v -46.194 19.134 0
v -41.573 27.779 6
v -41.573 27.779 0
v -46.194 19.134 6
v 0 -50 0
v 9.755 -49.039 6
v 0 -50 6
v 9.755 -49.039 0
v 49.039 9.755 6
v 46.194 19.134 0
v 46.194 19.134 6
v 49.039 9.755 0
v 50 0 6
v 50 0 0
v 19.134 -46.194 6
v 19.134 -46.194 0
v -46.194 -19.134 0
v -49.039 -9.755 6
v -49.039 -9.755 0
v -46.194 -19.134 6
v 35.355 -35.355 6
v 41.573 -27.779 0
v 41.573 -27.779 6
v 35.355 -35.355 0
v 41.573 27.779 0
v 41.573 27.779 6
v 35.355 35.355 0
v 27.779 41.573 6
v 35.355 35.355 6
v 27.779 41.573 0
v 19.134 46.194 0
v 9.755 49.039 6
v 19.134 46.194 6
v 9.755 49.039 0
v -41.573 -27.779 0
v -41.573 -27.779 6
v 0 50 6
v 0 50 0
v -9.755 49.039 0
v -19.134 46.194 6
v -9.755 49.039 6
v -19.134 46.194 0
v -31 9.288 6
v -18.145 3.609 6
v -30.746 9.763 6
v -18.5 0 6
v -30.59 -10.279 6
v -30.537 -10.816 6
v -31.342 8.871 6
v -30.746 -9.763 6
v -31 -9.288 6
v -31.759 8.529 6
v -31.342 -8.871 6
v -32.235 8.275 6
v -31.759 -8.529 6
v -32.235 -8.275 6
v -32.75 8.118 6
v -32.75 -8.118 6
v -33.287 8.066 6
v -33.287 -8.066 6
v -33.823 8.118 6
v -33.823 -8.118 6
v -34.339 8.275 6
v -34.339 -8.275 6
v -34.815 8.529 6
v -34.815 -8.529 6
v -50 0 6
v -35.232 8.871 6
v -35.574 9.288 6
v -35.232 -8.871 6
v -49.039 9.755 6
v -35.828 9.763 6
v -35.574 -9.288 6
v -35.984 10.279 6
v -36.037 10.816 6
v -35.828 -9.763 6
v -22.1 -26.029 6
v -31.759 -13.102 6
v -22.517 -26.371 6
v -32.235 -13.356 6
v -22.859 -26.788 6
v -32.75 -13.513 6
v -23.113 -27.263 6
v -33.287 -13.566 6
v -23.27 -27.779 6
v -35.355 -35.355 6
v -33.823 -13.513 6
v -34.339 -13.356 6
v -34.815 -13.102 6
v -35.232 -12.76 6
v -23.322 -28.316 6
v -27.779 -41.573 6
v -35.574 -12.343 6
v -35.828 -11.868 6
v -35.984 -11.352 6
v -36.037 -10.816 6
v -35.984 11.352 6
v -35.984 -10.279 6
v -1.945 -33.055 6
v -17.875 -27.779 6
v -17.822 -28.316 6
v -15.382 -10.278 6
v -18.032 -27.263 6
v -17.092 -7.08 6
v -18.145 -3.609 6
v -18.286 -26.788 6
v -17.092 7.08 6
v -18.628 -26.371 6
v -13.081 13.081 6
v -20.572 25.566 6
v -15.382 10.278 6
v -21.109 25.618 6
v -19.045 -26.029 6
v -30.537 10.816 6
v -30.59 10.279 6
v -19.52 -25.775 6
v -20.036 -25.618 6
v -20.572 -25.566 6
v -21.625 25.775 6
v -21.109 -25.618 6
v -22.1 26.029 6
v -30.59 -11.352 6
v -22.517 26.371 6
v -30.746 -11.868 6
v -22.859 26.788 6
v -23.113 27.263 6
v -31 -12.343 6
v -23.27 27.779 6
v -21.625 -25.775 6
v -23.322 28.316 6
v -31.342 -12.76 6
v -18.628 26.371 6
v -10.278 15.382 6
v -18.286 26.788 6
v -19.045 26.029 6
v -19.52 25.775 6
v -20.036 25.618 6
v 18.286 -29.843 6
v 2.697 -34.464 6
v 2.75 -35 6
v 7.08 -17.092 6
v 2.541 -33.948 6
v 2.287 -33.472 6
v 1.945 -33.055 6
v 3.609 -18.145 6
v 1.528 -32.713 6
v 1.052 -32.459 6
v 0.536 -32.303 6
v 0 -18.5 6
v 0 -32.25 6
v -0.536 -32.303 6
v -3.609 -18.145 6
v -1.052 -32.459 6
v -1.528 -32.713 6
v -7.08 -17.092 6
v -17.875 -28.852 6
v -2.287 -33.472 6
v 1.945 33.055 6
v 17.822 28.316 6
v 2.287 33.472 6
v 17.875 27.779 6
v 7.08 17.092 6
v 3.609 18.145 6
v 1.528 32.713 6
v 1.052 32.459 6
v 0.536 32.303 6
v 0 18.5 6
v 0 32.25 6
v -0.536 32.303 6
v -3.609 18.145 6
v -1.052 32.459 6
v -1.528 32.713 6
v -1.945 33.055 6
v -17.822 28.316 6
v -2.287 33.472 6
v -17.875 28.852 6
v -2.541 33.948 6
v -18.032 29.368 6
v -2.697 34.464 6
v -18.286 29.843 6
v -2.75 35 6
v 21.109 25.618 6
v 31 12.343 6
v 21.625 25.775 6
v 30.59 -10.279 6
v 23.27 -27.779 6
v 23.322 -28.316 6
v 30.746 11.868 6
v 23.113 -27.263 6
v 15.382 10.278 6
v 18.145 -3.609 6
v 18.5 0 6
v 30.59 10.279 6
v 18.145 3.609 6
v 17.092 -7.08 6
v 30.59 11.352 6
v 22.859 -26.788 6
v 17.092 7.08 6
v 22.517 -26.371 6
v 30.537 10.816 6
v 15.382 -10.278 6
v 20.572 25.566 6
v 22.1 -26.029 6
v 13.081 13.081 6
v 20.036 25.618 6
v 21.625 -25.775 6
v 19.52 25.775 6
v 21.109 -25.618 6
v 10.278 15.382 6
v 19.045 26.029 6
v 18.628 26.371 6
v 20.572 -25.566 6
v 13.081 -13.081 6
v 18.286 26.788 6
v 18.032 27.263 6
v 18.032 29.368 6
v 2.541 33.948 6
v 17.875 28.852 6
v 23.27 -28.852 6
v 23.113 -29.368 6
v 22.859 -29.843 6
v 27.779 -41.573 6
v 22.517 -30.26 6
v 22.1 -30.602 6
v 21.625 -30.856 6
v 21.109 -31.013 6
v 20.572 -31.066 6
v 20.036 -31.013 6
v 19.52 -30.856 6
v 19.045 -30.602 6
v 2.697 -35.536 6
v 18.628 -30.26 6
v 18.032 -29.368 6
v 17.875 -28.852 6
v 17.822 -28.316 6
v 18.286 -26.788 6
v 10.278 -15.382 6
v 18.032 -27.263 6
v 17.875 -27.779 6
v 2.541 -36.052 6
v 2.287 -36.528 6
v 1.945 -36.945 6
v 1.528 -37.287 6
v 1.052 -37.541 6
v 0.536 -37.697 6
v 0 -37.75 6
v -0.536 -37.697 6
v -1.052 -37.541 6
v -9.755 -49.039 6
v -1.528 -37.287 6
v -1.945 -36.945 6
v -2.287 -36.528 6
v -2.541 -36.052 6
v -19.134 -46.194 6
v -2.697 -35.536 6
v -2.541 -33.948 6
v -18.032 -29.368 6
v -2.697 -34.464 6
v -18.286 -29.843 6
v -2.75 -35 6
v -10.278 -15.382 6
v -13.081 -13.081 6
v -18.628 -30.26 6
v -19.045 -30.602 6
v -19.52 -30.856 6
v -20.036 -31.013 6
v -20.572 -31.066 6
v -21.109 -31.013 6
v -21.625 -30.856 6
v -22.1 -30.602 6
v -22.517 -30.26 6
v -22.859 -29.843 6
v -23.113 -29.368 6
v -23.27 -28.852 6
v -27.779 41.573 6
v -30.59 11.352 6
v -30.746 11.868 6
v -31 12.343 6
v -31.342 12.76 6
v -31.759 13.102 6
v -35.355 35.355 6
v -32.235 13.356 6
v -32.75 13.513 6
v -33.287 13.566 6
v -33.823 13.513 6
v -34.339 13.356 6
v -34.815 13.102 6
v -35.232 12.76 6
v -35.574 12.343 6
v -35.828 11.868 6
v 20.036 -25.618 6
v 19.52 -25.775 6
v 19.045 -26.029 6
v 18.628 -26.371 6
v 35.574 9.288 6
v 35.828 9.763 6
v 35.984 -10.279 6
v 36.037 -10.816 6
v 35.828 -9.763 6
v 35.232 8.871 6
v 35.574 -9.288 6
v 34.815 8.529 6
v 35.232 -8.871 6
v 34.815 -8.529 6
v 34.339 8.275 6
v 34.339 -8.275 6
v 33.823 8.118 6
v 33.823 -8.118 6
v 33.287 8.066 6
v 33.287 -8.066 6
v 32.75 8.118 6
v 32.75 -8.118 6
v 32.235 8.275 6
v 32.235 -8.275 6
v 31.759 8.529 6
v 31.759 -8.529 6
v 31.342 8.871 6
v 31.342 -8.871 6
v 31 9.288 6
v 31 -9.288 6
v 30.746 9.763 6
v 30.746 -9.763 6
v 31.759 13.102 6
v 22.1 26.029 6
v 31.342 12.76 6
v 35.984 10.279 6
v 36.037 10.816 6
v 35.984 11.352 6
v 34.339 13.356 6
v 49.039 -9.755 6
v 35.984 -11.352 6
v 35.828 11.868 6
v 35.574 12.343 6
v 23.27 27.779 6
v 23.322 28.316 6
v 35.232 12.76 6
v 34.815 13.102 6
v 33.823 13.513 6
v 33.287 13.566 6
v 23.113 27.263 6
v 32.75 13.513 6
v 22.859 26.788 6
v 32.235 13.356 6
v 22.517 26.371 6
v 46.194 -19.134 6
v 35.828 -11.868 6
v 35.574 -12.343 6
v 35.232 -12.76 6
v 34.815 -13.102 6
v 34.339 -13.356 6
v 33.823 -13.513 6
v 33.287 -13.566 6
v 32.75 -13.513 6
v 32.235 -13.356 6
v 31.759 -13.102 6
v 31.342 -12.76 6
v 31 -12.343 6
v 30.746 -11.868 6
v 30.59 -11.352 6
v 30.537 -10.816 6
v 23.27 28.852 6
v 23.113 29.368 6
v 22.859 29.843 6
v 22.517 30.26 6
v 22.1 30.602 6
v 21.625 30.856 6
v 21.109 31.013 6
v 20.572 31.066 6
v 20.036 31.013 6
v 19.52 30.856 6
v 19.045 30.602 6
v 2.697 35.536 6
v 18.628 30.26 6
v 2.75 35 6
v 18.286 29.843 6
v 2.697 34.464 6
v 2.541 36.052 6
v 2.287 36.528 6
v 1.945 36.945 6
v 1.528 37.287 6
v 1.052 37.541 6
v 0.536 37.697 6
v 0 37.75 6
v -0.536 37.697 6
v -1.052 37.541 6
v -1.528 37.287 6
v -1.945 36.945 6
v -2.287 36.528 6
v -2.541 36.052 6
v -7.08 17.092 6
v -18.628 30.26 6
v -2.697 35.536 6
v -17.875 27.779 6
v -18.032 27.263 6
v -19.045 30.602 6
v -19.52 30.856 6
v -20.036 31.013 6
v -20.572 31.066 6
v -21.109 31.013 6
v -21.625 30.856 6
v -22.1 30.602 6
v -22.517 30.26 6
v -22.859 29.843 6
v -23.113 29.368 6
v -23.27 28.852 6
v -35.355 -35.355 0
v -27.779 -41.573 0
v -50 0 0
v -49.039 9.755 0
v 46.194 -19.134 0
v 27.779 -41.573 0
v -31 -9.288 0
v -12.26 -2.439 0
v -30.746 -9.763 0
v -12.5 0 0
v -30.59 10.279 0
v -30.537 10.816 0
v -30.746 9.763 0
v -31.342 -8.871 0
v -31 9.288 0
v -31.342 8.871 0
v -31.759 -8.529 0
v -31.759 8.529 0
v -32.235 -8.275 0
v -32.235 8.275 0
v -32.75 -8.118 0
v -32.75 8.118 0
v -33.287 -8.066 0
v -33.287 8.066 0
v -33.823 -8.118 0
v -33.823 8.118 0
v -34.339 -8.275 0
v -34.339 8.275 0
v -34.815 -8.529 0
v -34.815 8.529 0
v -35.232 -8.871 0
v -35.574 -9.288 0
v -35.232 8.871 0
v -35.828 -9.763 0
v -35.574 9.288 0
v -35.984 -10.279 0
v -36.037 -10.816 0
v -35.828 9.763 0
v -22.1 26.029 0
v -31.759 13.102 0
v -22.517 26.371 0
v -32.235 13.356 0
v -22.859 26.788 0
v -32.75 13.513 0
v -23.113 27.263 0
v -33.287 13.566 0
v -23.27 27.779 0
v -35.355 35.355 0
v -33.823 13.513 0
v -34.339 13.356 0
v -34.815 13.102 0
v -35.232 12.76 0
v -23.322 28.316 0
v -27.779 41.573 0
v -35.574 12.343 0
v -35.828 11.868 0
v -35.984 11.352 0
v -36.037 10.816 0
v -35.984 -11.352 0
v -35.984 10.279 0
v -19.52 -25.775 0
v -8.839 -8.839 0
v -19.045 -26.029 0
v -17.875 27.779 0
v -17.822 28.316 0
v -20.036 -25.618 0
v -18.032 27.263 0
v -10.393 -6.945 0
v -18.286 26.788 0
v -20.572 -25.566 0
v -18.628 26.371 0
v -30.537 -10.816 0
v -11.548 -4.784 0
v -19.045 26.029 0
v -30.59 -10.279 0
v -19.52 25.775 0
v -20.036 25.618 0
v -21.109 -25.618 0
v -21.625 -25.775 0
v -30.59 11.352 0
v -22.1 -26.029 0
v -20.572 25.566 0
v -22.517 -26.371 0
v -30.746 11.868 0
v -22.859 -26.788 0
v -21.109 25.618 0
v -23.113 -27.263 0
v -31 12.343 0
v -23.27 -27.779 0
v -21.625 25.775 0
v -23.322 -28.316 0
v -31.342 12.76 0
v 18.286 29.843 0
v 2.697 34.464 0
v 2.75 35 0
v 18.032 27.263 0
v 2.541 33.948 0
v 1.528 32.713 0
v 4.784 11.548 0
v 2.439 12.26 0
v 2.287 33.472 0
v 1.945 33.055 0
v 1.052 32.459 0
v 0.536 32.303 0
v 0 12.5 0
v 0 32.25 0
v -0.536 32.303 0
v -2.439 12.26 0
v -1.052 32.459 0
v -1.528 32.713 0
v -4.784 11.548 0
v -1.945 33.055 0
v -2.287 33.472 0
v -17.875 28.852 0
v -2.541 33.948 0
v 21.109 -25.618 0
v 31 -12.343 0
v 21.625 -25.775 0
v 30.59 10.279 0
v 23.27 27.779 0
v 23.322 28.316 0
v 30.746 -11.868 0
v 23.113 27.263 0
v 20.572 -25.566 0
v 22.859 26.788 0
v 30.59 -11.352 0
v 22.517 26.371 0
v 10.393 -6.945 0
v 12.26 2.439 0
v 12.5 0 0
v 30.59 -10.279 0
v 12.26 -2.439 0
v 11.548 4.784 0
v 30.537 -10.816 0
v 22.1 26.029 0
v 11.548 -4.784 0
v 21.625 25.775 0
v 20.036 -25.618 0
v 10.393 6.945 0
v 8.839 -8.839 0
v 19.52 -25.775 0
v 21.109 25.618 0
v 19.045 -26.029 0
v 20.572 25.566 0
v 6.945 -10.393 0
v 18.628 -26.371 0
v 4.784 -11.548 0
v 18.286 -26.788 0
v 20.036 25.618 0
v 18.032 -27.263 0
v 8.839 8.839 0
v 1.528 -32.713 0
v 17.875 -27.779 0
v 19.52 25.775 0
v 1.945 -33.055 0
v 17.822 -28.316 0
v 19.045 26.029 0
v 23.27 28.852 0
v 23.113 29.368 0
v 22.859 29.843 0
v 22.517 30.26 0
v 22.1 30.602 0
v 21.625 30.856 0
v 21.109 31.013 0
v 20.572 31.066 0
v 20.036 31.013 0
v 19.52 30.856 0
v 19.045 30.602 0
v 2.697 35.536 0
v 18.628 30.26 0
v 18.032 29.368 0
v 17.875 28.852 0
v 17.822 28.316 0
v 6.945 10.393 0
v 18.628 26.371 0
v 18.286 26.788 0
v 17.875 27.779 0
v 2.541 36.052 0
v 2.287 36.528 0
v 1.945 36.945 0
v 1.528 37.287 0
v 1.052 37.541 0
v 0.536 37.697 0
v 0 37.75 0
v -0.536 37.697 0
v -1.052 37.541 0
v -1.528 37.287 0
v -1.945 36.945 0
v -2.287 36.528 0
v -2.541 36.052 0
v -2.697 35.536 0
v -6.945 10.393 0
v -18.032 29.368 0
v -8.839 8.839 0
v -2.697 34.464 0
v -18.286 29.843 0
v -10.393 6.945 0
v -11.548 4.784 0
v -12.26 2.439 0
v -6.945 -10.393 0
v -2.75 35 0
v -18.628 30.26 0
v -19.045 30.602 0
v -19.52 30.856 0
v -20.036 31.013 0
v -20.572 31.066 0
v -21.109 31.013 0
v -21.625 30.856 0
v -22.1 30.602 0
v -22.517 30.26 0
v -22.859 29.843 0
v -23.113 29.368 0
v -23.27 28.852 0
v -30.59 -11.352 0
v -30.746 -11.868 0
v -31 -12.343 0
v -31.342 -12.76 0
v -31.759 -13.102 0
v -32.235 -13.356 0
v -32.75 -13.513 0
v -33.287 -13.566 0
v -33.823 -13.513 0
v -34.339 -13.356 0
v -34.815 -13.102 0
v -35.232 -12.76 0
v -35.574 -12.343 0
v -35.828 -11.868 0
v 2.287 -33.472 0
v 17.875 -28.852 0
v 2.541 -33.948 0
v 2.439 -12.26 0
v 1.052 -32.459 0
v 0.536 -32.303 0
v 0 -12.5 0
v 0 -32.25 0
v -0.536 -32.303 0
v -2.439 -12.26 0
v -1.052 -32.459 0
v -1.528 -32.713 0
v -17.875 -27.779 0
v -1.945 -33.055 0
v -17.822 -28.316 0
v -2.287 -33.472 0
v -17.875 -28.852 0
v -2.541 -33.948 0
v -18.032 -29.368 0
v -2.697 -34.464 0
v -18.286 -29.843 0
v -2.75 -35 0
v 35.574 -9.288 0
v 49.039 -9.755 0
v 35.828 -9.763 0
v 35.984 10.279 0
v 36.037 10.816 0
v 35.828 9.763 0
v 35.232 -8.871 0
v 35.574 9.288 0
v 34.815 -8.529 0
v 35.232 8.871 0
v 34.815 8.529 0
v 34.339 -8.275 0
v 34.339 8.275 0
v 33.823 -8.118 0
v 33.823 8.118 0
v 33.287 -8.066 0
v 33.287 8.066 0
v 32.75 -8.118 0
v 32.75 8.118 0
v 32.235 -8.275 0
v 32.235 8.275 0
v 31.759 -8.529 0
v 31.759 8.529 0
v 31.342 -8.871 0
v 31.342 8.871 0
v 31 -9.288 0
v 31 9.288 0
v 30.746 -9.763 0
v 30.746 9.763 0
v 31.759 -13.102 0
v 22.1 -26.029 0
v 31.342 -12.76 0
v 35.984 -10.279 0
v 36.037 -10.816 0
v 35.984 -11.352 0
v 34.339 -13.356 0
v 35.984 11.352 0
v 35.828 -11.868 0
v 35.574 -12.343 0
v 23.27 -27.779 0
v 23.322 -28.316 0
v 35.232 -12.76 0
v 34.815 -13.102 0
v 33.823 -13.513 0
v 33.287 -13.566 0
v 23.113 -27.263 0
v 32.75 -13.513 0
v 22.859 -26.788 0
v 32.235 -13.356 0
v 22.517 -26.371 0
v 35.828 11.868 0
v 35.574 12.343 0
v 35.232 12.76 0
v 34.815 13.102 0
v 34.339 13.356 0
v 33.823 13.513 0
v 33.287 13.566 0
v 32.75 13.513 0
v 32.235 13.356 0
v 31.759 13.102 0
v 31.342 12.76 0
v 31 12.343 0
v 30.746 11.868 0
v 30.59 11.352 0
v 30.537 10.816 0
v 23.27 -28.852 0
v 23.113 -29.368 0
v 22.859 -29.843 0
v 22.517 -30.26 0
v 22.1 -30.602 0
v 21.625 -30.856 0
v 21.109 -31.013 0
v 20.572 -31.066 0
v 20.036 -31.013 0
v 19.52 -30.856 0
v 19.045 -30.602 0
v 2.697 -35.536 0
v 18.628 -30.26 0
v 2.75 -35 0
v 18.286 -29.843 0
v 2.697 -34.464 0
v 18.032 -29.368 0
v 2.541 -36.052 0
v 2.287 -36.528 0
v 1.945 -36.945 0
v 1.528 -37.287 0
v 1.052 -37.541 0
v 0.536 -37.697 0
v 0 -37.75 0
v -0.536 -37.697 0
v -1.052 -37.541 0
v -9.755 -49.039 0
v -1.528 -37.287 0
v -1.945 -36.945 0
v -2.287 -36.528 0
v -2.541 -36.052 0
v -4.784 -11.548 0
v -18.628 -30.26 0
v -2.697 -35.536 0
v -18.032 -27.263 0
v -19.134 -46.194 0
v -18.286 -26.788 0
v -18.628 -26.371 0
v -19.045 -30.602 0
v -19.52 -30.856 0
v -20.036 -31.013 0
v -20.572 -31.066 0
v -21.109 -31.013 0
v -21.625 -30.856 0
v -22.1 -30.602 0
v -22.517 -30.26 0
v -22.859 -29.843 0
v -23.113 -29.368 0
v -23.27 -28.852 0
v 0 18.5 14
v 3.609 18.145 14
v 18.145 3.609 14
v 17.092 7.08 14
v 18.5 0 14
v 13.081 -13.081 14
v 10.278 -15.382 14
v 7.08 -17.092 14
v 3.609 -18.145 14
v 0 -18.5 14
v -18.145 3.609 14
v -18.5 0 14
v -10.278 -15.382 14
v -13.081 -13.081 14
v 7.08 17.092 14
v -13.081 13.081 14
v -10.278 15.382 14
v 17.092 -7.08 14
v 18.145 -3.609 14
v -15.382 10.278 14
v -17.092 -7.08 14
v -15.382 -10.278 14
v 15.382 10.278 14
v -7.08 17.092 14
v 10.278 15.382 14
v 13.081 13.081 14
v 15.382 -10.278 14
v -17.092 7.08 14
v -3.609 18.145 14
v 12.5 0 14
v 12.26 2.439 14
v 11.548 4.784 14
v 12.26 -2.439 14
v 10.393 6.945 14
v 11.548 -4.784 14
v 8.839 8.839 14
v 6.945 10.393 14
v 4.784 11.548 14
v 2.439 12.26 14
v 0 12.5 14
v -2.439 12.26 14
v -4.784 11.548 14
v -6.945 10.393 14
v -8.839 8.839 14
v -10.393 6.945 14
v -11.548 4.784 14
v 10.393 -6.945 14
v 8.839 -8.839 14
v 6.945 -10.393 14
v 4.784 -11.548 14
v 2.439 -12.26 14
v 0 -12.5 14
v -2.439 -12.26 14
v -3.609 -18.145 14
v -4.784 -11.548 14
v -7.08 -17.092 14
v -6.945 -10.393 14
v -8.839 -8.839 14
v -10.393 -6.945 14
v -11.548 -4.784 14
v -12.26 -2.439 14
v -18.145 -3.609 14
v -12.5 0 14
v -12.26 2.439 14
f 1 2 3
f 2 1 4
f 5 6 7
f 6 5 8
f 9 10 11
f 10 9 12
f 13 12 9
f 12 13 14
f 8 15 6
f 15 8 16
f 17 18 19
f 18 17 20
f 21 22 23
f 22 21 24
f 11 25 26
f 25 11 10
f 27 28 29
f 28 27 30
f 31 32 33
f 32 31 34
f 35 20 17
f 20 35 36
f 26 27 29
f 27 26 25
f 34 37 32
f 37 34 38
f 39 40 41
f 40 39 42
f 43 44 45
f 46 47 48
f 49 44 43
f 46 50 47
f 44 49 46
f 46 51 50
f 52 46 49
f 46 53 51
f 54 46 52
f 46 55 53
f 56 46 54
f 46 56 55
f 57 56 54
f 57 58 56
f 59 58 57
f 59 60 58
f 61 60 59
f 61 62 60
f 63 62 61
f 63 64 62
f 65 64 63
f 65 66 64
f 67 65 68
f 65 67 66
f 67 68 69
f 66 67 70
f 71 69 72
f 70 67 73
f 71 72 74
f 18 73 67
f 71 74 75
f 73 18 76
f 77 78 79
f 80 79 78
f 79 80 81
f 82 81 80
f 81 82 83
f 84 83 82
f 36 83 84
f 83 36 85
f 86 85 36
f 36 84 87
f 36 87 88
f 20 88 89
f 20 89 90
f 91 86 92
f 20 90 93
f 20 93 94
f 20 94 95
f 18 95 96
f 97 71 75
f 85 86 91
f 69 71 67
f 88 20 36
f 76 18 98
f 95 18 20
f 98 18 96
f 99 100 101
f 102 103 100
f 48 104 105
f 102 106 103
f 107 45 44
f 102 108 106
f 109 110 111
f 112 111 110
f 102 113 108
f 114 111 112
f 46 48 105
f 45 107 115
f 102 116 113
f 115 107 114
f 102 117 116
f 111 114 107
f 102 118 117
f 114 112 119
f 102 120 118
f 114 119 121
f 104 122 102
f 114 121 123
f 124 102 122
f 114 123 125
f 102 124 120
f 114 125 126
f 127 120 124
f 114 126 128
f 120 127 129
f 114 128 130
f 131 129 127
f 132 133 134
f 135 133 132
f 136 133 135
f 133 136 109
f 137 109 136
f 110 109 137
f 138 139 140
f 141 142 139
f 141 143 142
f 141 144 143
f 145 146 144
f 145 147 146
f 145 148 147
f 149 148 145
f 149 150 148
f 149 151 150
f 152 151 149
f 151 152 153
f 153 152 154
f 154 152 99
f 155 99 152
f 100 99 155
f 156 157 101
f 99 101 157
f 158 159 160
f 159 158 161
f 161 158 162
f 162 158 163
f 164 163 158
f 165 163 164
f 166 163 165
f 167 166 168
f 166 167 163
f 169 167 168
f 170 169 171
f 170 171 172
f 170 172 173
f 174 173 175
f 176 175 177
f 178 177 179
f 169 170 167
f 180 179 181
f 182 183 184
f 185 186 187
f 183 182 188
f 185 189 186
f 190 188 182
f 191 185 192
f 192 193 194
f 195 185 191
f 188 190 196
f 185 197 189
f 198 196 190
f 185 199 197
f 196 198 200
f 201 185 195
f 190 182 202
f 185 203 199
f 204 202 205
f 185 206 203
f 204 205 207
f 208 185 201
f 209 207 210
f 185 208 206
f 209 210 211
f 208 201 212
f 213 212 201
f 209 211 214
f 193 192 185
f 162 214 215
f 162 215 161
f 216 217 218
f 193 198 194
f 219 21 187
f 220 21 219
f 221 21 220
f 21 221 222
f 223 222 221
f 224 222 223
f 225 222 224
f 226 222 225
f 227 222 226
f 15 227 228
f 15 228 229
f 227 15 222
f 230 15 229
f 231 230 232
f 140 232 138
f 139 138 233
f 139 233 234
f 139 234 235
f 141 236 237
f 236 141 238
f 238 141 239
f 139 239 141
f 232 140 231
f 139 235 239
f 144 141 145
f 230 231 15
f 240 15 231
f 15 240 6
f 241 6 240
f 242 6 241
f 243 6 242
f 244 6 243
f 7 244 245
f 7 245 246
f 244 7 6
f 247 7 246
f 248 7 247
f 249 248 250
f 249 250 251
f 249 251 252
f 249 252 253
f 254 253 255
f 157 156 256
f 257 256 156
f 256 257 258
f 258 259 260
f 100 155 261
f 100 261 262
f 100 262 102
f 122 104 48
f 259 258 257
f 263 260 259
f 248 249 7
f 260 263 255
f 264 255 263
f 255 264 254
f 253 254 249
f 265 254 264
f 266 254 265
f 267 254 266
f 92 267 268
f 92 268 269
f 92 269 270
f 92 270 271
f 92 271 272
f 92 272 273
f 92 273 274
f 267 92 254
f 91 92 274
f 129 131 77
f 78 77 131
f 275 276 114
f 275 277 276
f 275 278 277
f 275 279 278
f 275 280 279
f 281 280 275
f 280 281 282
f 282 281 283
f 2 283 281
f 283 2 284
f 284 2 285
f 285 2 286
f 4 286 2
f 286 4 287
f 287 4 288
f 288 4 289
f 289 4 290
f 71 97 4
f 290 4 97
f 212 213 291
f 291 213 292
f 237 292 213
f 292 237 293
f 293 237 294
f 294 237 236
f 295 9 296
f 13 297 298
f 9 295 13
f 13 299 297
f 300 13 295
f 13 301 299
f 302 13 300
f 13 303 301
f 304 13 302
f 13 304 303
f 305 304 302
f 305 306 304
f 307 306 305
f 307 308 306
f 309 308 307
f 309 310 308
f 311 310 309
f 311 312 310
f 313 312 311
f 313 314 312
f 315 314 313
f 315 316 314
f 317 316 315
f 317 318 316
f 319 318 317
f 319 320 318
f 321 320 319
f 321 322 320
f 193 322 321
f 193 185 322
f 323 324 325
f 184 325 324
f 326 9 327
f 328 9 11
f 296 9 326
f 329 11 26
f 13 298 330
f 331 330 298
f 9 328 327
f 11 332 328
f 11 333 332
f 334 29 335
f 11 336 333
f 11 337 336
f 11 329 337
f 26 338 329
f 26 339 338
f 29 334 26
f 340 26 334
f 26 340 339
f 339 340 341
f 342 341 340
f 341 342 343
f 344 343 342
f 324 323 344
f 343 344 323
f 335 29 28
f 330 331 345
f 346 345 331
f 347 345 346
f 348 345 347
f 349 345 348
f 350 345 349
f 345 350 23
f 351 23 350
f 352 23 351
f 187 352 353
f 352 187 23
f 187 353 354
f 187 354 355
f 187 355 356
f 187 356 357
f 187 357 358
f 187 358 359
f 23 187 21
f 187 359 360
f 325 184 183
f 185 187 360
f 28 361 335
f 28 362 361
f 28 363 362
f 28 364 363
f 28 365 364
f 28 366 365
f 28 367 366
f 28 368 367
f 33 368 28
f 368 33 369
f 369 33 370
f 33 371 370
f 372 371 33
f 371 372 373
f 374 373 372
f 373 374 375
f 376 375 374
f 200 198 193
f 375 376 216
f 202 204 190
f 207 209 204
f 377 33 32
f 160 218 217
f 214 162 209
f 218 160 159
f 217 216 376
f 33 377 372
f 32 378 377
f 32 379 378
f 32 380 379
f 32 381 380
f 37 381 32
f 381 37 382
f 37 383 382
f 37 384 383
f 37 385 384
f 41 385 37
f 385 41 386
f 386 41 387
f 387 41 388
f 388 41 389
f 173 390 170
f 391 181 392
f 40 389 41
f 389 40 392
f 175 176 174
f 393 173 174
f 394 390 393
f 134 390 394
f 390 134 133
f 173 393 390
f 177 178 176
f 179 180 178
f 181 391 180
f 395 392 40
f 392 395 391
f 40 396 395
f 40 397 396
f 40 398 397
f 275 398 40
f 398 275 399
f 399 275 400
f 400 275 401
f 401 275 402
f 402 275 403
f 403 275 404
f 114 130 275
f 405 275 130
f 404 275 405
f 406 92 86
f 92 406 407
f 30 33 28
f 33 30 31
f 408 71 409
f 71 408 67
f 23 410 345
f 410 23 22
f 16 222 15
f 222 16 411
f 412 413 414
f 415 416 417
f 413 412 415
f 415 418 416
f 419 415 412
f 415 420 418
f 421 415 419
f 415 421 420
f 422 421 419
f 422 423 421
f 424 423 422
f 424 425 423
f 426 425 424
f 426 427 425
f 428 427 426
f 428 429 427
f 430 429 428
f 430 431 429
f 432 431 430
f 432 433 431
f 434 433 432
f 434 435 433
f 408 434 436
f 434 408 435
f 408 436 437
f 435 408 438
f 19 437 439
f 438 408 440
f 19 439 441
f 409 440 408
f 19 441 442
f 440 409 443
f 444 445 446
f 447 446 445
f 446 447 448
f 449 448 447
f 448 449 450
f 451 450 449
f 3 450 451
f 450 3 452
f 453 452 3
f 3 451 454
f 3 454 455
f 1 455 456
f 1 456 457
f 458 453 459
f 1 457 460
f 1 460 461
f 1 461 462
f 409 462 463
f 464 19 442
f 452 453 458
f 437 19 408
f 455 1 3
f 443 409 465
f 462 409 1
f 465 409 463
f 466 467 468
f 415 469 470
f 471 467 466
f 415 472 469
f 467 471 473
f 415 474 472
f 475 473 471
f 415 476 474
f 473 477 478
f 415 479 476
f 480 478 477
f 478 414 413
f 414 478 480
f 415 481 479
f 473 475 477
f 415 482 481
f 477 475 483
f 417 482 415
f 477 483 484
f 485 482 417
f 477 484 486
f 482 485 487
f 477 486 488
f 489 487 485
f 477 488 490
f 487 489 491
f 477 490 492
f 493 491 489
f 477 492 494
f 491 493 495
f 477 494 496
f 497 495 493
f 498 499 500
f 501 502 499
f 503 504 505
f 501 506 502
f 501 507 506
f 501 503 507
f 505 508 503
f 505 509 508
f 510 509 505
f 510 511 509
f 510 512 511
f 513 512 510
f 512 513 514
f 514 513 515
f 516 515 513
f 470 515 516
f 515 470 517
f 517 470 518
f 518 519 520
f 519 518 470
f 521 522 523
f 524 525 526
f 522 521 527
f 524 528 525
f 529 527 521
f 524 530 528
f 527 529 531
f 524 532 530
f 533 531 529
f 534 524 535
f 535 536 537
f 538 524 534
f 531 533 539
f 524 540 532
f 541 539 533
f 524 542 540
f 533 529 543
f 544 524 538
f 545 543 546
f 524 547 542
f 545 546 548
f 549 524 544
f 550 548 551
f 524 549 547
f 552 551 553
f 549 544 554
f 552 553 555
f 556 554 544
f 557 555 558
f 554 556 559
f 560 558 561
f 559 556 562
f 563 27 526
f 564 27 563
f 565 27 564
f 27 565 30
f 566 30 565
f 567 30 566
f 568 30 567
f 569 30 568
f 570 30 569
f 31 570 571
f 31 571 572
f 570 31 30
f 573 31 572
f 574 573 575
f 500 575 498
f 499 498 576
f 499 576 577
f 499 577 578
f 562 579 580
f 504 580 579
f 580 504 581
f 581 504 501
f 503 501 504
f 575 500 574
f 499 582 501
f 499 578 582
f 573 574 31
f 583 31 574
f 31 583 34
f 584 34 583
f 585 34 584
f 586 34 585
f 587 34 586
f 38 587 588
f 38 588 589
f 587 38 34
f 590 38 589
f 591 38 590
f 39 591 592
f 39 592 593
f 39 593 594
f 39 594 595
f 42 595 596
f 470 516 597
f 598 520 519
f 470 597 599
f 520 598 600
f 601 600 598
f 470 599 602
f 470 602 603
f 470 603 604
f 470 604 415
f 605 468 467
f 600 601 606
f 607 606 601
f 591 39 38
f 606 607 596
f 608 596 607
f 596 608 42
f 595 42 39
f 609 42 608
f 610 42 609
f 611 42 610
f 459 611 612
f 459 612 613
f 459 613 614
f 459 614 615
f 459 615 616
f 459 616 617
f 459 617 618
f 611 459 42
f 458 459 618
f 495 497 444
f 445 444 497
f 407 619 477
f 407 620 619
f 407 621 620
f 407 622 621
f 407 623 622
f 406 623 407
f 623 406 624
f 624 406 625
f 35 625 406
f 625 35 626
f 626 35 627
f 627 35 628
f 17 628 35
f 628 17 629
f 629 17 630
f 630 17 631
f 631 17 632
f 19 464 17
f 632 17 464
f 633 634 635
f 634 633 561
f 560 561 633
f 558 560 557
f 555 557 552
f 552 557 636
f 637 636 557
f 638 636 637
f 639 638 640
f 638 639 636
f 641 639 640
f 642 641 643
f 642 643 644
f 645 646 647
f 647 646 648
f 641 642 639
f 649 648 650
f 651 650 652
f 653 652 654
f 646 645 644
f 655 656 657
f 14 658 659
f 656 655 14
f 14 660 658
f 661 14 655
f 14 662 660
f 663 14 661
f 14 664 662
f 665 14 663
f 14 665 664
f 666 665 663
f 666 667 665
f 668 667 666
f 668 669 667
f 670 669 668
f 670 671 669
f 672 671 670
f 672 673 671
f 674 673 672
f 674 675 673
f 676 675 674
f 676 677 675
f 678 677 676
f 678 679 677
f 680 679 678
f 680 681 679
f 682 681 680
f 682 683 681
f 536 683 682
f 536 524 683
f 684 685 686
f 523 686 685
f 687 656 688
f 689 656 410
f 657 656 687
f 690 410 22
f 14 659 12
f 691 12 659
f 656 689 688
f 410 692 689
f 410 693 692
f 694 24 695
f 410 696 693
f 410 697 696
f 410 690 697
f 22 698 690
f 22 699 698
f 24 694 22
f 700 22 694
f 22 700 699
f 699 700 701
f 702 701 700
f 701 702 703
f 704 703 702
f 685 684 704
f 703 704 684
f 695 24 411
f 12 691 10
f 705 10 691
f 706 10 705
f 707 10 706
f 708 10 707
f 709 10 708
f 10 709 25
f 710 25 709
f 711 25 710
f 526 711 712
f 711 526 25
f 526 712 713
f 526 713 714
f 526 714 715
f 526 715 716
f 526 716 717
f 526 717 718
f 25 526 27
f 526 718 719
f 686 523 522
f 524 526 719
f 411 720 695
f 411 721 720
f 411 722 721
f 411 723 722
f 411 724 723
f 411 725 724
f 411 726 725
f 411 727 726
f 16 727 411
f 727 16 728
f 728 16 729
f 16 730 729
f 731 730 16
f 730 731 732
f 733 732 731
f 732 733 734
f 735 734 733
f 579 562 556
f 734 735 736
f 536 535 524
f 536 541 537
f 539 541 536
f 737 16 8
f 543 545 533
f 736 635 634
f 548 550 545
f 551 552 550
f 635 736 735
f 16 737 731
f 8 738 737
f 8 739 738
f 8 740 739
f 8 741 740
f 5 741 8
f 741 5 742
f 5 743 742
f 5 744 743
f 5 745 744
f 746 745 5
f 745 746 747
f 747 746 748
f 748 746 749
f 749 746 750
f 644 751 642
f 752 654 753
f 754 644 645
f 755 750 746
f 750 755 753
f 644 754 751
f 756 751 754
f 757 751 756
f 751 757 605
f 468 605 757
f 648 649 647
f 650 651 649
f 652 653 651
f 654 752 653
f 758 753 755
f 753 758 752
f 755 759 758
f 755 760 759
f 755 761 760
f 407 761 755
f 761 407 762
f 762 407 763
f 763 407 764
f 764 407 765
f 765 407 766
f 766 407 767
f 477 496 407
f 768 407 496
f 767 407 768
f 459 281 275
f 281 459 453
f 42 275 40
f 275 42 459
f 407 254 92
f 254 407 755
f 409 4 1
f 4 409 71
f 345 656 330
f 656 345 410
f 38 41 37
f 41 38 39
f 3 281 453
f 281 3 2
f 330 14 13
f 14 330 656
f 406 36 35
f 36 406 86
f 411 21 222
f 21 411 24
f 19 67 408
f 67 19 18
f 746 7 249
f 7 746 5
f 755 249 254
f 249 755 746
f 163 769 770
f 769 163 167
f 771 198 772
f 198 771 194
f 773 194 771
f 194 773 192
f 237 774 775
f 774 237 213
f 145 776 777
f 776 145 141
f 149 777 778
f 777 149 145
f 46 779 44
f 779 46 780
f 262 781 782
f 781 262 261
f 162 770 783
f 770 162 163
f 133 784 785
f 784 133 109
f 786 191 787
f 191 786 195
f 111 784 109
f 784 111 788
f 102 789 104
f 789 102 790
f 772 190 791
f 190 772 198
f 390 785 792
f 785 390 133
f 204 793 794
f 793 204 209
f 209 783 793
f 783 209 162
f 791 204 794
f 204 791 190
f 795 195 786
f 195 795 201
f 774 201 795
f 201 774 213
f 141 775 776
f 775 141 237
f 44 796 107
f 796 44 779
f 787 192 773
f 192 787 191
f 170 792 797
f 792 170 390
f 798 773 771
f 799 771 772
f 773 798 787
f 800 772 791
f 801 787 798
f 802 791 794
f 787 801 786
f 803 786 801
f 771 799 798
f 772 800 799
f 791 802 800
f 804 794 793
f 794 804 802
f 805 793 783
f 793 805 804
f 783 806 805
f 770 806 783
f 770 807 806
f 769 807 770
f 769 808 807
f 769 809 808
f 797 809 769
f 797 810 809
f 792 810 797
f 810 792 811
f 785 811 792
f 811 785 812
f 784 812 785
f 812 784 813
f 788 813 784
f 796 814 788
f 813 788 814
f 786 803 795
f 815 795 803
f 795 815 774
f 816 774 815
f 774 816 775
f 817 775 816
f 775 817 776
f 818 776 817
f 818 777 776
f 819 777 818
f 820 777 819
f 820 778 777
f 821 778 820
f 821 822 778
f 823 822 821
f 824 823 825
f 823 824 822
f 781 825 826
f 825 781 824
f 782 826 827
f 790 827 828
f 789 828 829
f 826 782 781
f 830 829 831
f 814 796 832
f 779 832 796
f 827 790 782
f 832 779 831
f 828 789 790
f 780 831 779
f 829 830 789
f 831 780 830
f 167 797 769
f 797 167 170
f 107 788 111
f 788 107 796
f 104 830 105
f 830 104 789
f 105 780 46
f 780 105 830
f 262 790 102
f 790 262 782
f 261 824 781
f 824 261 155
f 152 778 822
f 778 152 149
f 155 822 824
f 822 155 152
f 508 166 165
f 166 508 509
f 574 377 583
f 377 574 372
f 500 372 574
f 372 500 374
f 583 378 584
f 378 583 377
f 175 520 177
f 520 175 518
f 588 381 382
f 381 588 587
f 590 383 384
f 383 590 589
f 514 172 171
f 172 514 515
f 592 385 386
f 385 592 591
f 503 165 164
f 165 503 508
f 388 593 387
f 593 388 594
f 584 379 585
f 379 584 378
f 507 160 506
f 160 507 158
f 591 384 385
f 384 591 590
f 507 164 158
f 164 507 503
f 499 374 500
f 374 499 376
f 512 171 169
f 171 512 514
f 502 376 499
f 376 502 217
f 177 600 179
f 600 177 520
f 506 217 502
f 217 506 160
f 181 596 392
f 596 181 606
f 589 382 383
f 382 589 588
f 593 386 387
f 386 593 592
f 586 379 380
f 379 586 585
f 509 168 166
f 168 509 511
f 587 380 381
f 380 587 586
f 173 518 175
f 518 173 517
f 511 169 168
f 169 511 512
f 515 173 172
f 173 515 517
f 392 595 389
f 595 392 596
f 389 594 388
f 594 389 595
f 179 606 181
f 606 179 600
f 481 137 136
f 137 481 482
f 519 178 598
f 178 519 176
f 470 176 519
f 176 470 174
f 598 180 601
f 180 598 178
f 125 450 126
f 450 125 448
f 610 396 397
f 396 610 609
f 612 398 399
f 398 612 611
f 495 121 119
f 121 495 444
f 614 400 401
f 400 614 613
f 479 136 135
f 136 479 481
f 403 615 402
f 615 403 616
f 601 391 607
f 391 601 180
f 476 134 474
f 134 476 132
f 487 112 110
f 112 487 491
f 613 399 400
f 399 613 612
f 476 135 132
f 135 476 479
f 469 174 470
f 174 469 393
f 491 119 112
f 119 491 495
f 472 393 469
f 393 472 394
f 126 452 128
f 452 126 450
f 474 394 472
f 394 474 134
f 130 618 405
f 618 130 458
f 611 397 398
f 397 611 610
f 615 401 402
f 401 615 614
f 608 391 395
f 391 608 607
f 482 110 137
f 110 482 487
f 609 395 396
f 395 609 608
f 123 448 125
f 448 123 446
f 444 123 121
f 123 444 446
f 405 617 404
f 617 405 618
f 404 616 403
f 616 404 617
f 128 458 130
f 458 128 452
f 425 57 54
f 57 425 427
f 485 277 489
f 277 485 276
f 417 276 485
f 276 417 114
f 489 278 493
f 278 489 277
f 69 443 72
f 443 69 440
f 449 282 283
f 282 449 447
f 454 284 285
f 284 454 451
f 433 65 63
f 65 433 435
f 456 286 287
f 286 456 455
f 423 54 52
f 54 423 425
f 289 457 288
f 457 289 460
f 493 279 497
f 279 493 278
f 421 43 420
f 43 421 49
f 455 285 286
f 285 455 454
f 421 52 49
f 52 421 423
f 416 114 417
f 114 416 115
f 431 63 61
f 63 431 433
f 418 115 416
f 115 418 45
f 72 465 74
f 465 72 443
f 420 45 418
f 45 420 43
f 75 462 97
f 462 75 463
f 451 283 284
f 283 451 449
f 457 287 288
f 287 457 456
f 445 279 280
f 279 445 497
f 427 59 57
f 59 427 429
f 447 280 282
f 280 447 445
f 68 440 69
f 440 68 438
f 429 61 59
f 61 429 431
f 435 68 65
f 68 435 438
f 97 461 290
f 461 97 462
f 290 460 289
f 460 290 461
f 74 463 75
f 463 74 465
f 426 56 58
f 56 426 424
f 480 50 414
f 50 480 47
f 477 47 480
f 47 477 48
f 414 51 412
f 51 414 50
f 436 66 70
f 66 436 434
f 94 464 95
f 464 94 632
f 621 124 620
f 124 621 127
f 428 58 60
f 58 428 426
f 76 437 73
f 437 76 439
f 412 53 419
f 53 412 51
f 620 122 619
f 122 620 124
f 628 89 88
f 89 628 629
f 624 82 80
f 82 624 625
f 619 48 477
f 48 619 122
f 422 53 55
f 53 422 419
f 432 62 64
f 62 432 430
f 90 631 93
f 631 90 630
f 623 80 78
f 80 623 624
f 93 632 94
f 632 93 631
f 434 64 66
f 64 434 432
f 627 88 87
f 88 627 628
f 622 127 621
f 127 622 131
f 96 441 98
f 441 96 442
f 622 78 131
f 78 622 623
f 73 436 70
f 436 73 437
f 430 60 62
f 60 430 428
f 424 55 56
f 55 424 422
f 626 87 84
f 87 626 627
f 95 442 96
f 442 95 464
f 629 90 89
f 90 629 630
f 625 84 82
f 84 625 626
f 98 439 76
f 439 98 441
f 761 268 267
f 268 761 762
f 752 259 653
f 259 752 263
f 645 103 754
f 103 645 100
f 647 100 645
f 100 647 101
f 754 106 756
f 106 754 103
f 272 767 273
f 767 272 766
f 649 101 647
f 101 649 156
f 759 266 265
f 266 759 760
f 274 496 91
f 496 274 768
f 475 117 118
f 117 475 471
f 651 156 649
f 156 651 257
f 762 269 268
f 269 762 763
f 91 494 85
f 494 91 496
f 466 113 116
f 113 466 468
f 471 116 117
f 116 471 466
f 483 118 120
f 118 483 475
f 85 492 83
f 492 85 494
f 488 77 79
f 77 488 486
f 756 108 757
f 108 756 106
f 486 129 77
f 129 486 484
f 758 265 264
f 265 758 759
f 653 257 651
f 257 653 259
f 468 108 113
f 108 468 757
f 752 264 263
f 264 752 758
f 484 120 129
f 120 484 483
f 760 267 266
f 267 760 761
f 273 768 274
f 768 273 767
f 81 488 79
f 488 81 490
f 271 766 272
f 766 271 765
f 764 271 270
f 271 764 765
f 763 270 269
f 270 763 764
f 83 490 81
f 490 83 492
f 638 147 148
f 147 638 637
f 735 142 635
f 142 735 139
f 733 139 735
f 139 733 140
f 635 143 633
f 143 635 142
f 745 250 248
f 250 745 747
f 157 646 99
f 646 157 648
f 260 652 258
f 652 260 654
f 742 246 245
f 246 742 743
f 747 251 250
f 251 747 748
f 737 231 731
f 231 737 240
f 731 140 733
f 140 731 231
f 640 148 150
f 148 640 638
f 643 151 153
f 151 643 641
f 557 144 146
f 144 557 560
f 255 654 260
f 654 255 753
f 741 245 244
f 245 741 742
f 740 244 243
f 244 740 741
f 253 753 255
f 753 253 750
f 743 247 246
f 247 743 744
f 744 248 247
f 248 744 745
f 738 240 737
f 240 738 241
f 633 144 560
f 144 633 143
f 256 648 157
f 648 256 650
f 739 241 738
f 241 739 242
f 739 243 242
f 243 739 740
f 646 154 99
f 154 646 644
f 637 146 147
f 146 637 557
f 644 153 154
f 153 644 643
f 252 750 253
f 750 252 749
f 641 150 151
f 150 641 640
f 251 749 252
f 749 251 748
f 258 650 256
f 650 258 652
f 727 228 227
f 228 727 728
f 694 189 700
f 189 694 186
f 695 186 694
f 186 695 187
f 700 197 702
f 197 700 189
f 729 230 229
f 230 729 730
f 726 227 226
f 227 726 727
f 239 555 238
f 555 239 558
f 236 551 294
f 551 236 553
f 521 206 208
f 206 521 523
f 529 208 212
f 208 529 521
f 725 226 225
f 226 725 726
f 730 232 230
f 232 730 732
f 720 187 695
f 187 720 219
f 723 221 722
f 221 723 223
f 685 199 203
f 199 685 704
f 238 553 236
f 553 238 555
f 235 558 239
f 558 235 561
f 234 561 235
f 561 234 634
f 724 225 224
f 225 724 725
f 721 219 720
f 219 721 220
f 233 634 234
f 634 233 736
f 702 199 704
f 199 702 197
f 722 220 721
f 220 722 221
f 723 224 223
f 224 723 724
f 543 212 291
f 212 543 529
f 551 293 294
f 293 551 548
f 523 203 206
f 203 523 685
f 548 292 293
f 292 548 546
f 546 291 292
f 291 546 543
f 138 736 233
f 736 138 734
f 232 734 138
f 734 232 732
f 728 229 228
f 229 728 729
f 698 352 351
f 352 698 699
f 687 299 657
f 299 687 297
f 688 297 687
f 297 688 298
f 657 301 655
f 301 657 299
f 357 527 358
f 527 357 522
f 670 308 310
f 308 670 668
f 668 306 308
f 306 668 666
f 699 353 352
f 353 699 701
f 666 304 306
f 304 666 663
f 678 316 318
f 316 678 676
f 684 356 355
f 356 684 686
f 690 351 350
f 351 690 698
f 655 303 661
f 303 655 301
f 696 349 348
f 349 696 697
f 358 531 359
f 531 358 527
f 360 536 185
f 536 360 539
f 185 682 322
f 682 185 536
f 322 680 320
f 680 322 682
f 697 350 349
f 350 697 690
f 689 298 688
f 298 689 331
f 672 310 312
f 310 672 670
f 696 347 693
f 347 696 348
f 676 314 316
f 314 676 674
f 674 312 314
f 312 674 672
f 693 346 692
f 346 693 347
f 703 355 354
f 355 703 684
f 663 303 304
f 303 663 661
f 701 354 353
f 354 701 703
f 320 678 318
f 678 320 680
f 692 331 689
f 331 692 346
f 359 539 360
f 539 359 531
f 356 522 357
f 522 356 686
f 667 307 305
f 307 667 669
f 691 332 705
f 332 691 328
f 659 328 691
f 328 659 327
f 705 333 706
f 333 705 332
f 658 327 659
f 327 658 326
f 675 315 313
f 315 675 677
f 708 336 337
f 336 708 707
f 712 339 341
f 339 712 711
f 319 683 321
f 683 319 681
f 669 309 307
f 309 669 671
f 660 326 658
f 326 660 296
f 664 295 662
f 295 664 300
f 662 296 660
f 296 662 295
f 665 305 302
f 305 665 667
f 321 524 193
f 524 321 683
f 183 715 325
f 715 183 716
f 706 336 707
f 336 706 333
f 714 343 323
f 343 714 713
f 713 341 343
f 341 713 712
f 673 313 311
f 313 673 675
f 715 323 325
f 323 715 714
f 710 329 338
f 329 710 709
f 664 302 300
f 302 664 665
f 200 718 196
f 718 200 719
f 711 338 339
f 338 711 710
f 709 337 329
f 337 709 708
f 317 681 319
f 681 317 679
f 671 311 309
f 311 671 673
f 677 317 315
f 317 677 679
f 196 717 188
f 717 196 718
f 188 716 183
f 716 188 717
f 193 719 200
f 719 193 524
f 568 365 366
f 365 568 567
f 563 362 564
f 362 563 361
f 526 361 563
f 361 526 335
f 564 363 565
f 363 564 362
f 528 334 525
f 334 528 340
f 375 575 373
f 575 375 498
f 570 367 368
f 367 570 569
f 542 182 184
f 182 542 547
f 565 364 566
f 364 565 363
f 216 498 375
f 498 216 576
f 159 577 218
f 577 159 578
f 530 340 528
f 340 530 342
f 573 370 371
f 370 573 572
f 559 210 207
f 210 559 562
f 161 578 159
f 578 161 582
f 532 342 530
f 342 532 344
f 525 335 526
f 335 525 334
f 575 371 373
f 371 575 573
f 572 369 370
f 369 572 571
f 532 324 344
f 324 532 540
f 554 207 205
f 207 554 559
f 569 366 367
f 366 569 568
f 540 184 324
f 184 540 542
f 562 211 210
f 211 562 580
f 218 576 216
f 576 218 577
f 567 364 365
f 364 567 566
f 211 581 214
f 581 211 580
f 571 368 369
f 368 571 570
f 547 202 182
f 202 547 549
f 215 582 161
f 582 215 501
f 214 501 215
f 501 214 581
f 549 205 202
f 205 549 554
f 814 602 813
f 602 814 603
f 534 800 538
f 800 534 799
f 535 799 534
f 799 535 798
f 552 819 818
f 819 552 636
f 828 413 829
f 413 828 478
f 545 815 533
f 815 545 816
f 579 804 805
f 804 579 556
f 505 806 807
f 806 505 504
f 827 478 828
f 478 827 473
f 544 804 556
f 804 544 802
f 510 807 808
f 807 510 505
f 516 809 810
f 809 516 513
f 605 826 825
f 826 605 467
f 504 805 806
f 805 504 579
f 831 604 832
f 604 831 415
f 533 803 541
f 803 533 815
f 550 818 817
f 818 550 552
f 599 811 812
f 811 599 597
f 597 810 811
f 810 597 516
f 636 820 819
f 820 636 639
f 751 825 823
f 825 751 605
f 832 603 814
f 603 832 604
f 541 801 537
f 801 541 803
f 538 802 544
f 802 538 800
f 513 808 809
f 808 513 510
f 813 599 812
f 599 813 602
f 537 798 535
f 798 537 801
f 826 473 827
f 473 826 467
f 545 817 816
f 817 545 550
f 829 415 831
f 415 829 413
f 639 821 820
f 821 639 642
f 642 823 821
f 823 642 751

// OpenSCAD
$fn = 32;

// ----------------------------------------------------------------------
// Flange Ø100 x 6
// 10 holes on a Ø70 bolt circle, bolted joints
// ----------------------------------------------------------------------

// --- parameters (mm) ---
flange_d = 100;  // outside diameter of the flange
thickness = 6;   // flange thickness
holes = 10;      // number of bolt holes
pcd = 70;        // bolt circle diameter
start_deg = 90;  // angle of the first hole, from +X
hole_d = 5.5;    // bolt hole diameter
bore_d = 25;     // central through bore
hub_d = 37;      // hub outside diameter
hub_h = 8;       // hub height above the flange face (0 = no hub)

// --- derived feature positions (mm) ---
height = thickness + hub_h;  // = 14   overall height of the part
pcd_r = pcd / 2;             // = 35   bolt circle radius
hole_step = 360 / holes;     // = 36   angular pitch
feature_centers = [
  [pcd_r * cos(start_deg + 0 * hole_step), pcd_r * sin(start_deg + 0 * hole_step)],
  [pcd_r * cos(start_deg + 1 * hole_step), pcd_r * sin(start_deg + 1 * hole_step)],
  [pcd_r * cos(start_deg + 2 * hole_step), pcd_r * sin(start_deg + 2 * hole_step)],
  [pcd_r * cos(start_deg + 3 * hole_step), pcd_r * sin(start_deg + 3 * hole_step)],
  [pcd_r * cos(start_deg + 4 * hole_step), pcd_r * sin(start_deg + 4 * hole_step)],
  [pcd_r * cos(start_deg + 5 * hole_step), pcd_r * sin(start_deg + 5 * hole_step)],
  [pcd_r * cos(start_deg + 6 * hole_step), pcd_r * sin(start_deg + 6 * hole_step)],
  [pcd_r * cos(start_deg + 7 * hole_step), pcd_r * sin(start_deg + 7 * hole_step)],
  [pcd_r * cos(start_deg + 8 * hole_step), pcd_r * sin(start_deg + 8 * hole_step)],
  [pcd_r * cos(start_deg + 9 * hole_step), pcd_r * sin(start_deg + 9 * hole_step)]
];   // bolt hole centres on the pitch circle

// flange disc, every hole and the bore cut straight through
difference() {
  union() {
    cylinder(d = flange_d, h = thickness);
    cylinder(d = hub_d, h = height);  // hub, overlapped into the flange
  }
  translate([0, 0, -1]) cylinder(d = bore_d, h = height + 2);  // bore, through
  for (centre = feature_centers)
    translate([centre[0], centre[1], -1]) cylinder(d = hole_d, h = thickness + 2);
}
